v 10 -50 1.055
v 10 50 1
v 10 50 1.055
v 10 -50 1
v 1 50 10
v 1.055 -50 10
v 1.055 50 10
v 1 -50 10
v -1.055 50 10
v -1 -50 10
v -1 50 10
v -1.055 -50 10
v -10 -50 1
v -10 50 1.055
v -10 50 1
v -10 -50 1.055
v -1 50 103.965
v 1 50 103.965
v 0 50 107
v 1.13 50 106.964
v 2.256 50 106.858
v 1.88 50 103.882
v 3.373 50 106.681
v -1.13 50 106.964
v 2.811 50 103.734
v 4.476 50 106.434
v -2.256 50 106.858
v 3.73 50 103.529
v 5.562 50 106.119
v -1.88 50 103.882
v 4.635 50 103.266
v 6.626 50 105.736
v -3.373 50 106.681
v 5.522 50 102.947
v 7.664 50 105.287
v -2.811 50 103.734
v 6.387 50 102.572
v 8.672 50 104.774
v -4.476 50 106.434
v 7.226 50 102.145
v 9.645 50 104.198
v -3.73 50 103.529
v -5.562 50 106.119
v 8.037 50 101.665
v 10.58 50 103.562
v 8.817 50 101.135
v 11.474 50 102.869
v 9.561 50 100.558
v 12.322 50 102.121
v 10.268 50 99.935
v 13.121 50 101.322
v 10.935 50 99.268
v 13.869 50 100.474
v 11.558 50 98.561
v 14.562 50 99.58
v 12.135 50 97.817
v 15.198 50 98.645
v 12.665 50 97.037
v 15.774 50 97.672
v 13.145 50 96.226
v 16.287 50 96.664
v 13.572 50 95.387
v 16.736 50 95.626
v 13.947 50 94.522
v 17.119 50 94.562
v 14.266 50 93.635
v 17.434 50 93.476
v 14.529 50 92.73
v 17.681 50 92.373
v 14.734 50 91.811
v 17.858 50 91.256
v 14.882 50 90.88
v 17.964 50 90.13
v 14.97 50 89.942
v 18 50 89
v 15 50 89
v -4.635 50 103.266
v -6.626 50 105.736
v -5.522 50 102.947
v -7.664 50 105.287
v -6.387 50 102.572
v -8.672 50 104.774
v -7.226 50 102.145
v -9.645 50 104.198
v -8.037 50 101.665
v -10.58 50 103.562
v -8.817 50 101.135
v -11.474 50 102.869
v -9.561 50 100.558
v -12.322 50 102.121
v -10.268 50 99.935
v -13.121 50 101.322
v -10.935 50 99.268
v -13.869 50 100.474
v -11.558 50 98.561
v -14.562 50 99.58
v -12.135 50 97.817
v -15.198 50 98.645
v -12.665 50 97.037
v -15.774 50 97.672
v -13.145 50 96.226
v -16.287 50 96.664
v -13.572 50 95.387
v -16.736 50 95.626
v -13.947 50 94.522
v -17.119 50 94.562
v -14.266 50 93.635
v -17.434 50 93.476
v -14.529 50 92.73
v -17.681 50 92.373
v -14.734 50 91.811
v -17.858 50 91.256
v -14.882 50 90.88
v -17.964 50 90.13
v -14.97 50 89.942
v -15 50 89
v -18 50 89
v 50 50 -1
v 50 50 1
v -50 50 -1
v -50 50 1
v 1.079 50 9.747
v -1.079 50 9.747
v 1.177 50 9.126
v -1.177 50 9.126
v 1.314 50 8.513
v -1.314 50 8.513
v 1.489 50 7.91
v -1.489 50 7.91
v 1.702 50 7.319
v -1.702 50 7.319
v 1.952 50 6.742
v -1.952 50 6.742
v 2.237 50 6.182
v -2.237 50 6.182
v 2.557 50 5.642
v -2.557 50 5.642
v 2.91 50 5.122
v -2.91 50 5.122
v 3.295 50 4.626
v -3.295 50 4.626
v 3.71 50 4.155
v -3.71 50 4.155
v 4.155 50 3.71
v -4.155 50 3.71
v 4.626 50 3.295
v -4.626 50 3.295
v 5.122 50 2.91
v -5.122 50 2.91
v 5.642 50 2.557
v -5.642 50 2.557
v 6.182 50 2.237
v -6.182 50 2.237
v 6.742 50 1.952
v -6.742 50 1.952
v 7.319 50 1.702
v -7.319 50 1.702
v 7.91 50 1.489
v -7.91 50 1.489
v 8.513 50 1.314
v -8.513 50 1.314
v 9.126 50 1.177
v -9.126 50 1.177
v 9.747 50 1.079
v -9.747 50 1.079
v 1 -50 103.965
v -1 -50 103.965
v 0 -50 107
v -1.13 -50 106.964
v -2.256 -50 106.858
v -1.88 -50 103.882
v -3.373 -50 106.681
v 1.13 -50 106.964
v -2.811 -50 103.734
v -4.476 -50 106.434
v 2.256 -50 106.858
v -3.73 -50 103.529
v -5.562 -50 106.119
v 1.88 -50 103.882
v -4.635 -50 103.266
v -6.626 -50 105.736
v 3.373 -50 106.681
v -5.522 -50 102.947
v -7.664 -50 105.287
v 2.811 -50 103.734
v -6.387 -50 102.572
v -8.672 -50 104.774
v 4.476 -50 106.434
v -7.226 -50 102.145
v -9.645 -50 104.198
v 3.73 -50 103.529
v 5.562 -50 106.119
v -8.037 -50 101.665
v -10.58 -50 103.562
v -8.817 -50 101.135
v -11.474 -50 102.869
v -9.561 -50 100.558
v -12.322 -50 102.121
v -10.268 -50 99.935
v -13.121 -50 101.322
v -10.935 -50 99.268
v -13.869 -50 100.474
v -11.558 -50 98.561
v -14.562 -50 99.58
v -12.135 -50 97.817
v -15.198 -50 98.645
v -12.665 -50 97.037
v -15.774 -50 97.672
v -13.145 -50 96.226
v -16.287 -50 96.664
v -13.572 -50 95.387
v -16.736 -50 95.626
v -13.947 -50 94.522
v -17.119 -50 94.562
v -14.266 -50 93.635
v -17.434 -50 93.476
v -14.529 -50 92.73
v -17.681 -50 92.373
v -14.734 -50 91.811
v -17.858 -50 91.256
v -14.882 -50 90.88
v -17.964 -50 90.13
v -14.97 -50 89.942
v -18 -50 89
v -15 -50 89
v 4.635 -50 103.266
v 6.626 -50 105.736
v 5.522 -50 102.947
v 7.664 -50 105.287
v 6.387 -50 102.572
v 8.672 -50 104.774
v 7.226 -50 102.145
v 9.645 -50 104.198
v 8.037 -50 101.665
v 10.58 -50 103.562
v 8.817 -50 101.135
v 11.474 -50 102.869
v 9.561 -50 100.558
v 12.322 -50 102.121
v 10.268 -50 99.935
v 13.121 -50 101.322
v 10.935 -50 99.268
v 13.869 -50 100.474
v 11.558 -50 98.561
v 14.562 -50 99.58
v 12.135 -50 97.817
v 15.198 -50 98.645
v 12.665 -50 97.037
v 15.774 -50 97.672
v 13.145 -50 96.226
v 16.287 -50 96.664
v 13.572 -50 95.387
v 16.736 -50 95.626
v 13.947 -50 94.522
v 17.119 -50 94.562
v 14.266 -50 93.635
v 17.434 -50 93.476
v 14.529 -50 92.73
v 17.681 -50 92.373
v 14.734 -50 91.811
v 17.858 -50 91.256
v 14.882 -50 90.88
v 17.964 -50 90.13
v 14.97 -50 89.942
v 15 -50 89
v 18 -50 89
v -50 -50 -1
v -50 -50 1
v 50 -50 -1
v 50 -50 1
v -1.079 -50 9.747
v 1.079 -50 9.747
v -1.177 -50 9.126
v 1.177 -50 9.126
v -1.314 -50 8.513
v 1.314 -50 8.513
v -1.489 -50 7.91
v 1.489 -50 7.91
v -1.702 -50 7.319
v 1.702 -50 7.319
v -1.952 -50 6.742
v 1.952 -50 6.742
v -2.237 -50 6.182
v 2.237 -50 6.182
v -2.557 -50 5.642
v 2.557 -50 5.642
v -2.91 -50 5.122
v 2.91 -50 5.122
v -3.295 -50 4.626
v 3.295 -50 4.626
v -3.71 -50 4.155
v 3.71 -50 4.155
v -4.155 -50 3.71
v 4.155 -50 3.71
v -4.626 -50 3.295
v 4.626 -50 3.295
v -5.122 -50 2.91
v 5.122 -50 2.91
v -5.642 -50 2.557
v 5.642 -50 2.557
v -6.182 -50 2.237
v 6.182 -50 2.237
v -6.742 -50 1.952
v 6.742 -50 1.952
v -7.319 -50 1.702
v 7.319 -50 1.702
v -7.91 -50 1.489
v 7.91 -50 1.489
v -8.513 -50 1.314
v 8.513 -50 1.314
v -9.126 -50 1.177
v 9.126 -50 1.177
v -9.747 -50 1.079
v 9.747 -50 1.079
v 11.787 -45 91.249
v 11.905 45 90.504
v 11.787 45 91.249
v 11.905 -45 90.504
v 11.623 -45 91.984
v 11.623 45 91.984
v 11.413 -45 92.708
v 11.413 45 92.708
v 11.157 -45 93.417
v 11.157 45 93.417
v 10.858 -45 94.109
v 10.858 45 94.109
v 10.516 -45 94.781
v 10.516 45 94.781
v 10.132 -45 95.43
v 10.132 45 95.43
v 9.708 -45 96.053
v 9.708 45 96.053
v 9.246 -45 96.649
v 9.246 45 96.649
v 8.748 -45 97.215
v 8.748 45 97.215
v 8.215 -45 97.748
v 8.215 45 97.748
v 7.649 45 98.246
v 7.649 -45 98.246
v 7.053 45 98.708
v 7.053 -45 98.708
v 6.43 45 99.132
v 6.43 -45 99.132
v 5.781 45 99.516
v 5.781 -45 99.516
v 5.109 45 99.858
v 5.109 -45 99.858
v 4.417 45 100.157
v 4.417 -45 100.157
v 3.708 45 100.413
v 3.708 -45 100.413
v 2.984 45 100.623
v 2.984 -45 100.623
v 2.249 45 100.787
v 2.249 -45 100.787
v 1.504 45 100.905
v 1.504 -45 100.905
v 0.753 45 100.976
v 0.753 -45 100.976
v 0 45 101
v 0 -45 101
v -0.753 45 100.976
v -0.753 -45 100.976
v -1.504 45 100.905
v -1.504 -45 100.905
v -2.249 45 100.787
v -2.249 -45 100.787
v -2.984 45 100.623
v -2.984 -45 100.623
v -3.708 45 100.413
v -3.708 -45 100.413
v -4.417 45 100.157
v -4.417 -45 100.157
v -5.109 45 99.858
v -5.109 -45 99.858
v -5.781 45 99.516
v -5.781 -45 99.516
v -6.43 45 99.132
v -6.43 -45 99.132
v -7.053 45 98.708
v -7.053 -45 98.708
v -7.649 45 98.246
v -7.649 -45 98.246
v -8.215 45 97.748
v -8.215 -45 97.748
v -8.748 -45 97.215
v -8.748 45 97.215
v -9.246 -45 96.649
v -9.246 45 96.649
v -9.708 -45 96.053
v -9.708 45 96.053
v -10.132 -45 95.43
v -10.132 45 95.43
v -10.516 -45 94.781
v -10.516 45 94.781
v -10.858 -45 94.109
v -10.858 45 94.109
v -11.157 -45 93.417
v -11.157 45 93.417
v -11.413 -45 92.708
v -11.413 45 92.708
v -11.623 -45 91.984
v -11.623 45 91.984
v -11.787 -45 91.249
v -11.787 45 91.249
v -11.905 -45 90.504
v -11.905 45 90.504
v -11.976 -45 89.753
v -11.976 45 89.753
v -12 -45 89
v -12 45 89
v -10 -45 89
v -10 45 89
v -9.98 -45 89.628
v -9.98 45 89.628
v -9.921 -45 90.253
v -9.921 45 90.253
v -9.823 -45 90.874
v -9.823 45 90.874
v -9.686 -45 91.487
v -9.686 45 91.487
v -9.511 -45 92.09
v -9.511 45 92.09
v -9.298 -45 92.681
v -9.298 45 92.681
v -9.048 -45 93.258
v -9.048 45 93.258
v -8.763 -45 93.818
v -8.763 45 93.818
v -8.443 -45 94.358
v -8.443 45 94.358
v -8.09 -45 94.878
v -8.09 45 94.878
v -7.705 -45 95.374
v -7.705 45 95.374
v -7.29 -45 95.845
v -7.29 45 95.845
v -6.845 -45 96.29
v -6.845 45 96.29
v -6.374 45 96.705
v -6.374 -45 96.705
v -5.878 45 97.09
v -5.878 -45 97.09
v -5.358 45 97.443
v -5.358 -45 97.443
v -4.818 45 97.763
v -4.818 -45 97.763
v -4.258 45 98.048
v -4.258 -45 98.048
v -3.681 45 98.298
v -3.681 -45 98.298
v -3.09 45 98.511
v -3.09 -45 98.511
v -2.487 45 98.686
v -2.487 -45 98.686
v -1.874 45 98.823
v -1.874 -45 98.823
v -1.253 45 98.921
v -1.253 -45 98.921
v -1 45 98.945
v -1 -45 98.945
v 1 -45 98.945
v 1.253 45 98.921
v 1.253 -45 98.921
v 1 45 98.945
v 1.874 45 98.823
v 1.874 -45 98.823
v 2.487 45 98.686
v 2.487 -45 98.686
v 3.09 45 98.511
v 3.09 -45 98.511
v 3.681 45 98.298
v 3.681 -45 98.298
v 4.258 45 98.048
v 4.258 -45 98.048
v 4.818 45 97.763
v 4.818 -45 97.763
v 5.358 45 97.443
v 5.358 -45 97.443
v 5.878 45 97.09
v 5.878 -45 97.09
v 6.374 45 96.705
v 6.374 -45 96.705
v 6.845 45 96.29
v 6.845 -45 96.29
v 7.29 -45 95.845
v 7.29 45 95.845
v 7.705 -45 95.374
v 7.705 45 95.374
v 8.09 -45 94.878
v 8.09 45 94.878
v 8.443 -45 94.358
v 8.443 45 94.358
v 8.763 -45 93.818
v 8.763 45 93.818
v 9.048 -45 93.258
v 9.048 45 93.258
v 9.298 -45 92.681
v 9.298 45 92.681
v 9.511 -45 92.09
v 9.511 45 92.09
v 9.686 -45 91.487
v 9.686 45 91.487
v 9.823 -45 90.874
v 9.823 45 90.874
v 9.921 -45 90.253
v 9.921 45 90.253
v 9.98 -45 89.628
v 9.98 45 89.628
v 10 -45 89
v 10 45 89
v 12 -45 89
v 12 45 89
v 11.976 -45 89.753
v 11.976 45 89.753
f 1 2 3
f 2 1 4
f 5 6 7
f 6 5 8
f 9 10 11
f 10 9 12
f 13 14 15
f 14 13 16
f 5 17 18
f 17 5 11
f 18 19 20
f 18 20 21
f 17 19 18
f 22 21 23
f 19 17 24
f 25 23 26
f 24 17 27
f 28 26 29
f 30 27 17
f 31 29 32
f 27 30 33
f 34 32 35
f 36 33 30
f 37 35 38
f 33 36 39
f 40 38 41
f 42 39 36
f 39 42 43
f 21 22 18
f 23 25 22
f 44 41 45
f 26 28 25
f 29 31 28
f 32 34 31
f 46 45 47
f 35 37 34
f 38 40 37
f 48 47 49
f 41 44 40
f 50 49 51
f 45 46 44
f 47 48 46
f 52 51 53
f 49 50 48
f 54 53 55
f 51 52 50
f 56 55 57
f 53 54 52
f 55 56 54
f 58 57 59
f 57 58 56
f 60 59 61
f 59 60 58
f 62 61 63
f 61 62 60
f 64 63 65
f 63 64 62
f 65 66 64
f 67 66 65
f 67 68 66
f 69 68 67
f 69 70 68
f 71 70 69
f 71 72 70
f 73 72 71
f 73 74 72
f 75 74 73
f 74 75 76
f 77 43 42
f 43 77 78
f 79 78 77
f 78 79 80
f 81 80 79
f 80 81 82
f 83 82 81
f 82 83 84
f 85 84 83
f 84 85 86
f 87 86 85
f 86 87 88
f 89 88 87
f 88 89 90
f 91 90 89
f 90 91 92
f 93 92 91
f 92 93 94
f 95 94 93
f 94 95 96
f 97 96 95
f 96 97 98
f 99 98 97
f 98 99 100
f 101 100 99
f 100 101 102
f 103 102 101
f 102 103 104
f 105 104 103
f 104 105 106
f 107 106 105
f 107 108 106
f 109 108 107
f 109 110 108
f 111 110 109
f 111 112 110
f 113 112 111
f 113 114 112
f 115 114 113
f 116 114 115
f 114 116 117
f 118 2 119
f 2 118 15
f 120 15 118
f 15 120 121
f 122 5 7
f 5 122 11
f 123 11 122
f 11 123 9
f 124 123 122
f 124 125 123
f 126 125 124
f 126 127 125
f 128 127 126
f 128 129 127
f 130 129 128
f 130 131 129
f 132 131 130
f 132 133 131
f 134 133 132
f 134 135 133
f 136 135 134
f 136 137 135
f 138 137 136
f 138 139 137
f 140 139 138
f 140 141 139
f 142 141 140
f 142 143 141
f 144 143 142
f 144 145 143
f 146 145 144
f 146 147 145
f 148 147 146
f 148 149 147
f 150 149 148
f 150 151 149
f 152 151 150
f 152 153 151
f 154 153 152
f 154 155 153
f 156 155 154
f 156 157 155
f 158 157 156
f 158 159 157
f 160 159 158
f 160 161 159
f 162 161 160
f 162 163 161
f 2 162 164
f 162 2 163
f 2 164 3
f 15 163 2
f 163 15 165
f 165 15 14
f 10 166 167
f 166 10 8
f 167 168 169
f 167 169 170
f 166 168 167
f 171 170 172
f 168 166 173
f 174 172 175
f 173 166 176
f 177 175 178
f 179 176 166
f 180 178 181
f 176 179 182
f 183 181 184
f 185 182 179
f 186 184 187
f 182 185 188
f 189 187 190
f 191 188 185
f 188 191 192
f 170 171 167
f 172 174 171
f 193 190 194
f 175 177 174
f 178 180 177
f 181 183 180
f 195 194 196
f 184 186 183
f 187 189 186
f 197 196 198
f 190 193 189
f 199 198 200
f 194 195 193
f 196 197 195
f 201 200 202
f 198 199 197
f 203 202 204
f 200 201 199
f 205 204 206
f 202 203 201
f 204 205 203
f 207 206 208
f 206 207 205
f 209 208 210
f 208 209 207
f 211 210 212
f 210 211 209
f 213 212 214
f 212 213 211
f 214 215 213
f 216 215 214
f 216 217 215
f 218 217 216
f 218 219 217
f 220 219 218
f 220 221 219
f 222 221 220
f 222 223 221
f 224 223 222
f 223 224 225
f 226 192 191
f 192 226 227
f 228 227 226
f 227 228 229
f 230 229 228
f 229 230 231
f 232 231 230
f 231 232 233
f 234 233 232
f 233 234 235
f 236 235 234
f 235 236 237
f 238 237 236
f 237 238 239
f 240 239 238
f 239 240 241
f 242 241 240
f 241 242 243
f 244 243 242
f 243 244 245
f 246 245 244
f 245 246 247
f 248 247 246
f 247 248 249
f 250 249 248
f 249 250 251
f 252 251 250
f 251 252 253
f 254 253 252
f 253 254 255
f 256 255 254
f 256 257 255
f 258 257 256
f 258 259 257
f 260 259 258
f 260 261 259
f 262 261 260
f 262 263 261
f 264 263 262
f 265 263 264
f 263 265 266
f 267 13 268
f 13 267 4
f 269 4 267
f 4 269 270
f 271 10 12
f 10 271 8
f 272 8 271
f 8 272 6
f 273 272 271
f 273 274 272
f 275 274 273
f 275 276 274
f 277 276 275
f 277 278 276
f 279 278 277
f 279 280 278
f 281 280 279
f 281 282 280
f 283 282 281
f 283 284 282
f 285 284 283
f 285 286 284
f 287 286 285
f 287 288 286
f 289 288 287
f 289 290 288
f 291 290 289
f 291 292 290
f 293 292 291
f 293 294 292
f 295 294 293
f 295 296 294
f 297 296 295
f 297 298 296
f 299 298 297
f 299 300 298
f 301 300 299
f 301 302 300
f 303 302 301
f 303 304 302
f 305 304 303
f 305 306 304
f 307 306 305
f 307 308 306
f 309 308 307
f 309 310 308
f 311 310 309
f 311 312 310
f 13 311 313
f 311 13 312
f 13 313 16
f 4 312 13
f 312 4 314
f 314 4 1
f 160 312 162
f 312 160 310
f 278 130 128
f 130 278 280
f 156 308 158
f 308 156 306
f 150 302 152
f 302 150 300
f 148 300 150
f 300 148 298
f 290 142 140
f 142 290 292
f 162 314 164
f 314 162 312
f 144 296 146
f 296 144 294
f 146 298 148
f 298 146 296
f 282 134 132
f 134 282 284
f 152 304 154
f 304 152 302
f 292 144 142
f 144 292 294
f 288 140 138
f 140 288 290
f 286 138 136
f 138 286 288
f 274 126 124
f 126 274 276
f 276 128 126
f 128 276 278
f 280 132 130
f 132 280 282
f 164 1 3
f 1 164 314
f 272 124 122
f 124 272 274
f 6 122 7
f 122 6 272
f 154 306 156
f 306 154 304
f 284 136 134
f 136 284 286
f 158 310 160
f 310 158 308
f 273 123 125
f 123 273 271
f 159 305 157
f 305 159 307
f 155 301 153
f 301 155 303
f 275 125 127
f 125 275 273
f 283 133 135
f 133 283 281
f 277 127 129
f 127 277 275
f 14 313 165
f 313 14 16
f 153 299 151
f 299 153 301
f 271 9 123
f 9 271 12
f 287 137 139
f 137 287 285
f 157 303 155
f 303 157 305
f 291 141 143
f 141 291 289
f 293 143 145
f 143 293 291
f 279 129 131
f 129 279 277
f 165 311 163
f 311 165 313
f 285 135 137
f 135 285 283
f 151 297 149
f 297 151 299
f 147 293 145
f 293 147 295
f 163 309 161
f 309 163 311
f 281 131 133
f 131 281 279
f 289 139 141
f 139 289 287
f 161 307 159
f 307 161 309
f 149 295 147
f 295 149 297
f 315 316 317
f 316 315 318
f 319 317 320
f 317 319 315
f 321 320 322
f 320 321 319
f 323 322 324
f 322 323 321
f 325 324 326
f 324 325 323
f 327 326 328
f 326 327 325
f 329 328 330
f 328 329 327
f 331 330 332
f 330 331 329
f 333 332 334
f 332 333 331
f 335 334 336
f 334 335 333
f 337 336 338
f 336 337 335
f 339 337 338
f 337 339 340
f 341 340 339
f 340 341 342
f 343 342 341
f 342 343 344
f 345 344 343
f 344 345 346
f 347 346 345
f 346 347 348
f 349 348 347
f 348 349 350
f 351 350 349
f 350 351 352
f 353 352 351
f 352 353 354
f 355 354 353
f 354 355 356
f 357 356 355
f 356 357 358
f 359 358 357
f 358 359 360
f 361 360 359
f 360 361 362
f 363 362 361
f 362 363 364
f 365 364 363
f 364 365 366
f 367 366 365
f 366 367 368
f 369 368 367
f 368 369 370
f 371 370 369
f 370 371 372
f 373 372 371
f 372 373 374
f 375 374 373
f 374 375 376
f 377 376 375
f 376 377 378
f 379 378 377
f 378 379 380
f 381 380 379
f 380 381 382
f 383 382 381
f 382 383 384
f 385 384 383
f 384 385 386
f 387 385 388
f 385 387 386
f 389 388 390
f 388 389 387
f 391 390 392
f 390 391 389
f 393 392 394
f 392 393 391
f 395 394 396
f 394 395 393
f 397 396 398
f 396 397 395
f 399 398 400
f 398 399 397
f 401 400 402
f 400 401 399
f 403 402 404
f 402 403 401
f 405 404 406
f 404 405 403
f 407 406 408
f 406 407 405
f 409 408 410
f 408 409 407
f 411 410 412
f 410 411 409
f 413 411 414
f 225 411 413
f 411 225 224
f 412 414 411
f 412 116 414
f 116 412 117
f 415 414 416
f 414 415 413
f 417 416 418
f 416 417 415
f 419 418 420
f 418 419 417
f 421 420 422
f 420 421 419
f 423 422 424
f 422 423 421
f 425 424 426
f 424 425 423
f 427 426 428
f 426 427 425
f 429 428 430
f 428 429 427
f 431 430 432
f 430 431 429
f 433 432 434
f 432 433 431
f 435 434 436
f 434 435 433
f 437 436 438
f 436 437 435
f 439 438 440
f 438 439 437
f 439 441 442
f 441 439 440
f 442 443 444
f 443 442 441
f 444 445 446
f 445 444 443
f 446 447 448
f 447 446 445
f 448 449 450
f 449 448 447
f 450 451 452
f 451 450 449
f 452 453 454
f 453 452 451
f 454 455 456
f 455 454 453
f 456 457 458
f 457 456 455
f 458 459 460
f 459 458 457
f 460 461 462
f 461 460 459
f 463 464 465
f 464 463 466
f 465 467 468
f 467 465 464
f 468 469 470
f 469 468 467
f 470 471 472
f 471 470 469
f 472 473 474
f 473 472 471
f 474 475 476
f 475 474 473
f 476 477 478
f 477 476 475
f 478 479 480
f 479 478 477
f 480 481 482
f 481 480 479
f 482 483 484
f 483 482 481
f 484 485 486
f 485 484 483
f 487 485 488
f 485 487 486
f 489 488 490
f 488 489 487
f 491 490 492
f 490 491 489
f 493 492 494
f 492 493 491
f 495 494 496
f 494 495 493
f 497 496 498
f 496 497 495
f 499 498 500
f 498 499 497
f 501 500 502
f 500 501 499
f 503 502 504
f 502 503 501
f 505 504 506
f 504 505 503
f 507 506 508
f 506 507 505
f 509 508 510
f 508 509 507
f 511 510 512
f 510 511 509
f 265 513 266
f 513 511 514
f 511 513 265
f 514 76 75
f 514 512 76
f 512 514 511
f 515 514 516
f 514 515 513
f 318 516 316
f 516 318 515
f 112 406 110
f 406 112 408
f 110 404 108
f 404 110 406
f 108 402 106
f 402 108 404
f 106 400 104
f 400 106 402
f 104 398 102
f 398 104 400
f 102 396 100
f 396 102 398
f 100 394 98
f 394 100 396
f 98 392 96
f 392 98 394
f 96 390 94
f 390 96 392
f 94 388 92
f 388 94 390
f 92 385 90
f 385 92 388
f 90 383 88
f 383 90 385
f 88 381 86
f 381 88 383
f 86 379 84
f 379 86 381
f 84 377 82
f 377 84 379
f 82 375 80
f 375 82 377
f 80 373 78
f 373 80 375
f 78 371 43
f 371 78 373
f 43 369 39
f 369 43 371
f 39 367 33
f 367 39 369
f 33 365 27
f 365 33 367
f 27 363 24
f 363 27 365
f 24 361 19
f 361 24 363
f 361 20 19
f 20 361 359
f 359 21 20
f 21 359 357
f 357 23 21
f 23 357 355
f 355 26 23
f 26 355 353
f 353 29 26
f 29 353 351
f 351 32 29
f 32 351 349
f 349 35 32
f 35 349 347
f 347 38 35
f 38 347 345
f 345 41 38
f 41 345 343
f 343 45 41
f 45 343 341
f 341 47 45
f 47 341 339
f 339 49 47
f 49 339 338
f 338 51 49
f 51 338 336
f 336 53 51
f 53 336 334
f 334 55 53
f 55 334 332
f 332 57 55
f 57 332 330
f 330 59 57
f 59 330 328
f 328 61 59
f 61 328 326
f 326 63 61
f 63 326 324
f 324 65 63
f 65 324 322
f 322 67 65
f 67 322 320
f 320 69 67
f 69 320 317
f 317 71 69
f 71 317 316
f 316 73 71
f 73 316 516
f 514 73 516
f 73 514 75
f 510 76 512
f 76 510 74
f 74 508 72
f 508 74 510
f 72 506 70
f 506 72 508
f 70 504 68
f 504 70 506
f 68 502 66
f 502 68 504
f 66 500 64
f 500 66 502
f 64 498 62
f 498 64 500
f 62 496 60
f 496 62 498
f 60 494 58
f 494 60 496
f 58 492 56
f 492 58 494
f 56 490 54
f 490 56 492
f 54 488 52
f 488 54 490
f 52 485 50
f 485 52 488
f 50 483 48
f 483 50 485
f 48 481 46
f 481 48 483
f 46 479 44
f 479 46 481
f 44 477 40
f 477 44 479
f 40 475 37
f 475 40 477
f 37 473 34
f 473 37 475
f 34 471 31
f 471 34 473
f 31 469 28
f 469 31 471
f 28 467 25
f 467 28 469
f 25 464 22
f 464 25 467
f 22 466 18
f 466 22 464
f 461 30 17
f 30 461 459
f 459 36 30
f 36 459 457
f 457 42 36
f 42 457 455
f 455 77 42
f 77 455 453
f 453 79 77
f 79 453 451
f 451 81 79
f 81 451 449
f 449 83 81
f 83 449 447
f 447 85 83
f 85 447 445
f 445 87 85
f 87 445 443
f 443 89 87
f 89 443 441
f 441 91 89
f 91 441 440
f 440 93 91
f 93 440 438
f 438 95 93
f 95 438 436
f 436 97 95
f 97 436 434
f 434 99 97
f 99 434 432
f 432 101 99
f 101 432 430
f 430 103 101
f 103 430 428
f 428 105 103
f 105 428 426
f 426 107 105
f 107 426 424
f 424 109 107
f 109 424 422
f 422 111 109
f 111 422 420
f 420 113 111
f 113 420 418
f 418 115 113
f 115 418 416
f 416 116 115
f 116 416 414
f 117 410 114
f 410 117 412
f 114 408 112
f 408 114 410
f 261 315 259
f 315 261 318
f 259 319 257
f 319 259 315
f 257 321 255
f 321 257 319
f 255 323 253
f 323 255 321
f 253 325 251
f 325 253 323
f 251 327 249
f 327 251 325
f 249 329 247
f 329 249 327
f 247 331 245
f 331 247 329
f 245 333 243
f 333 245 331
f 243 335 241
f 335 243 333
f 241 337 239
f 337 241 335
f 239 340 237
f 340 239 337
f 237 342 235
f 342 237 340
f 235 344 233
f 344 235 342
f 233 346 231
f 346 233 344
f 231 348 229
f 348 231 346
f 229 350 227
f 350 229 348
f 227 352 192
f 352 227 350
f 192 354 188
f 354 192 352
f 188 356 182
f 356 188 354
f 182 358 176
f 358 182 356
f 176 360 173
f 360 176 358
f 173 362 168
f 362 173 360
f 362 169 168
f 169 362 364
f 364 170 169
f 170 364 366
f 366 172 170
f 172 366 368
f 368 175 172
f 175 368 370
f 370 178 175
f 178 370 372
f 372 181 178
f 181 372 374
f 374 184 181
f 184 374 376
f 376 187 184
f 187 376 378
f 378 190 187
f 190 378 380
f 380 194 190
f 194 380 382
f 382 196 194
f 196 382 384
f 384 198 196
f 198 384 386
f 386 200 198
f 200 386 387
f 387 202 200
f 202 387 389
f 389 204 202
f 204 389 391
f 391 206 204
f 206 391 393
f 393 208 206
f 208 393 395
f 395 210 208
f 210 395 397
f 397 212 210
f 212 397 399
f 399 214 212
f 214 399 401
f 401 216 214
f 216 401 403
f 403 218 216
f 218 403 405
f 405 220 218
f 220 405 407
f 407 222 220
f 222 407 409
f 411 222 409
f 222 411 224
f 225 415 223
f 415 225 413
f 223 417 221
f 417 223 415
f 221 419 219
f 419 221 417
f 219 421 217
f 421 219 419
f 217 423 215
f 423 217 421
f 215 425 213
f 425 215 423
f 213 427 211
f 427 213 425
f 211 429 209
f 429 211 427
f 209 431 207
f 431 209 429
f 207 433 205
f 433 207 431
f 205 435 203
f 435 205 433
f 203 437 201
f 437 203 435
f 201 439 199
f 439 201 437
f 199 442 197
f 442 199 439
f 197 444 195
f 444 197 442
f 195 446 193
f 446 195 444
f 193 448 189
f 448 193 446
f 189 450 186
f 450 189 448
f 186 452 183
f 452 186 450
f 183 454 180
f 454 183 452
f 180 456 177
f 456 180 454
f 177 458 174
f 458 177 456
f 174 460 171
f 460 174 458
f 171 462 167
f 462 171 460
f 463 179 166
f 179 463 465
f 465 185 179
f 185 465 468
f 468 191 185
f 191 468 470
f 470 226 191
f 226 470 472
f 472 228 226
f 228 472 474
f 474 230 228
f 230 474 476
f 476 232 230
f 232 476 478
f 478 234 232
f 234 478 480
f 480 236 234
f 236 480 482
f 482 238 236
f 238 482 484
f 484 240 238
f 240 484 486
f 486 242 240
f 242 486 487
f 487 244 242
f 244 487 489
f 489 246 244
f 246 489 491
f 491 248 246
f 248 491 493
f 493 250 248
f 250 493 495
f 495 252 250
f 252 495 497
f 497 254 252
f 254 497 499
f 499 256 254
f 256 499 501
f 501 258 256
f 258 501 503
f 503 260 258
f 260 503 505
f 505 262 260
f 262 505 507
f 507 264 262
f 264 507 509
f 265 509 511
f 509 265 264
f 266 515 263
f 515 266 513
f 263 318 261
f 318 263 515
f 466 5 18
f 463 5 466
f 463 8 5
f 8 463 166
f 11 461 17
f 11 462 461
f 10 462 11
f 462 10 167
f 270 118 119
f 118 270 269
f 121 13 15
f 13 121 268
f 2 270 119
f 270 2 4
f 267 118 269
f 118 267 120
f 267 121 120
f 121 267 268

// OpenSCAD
plate_thickness = 2;
stand_length = 100;
stand_width = 100;
stand_height = 100;
stand_rounding = 10;
support_radius = 12;
support_stopper_length = 5;
support_stopper_scale = 1.5;

$fn=100;


module semicircle(radius, thickness) difference() {
    circle(r=radius);
    circle(r=radius-thickness);
    translate([0,-radius]) square(radius*2);
}

cube([stand_width,stand_length,plate_thickness], center=true);
translate([0,0,stand_height/2]) rotate([0,90,0]) cube([stand_height,stand_length,plate_thickness], center=true);

difference() {
    translate([0,0,stand_rounding/2]) cube([stand_rounding*2,stand_length,stand_rounding], center=true);
    translate([stand_rounding+plate_thickness/2,0,stand_rounding+plate_thickness/2])
      rotate([90,0,0]) cylinder(r=stand_rounding,h=stand_length+1, center=true);
    translate([-stand_rounding-plate_thickness/2,0,stand_rounding+plate_thickness/2])
      rotate([90,0,0]) cylinder(r=stand_rounding,h=stand_length+1, center=true);
}

translate([0,stand_length/2,stand_height-support_radius+1]) rotate([90,90,0]) {
    
  translate([0,0,support_stopper_length])
    linear_extrude(stand_length-2*support_stopper_length) semicircle(support_radius,plate_thickness);
  //cylinder(r=stand_rounding,h=stand_length+1, center=true);
  translate([0,0,support_stopper_length]) rotate([180,0,0]) linear_extrude(support_stopper_length, scale=support_stopper_scale) semicircle(support_radius,plate_thickness);
  translate([0,0,stand_length-support_stopper_length]) linear_extrude(support_stopper_length, scale=support_stopper_scale) semicircle(support_radius,plate_thickness);
}


module filler() translate([0,0,-plate_thickness/2]) difference() {
  cube([10,10,plate_thickness]);
  translate([0,0,-0.5]) rotate([0,0,45]) cube([15,10,plate_thickness+1]);
}


translate([0,-stand_length/2,stand_height+5]) rotate([0,90,0]) filler();
translate([0,stand_length/2,stand_height+5]) rotate([0,90,180]) filler();
